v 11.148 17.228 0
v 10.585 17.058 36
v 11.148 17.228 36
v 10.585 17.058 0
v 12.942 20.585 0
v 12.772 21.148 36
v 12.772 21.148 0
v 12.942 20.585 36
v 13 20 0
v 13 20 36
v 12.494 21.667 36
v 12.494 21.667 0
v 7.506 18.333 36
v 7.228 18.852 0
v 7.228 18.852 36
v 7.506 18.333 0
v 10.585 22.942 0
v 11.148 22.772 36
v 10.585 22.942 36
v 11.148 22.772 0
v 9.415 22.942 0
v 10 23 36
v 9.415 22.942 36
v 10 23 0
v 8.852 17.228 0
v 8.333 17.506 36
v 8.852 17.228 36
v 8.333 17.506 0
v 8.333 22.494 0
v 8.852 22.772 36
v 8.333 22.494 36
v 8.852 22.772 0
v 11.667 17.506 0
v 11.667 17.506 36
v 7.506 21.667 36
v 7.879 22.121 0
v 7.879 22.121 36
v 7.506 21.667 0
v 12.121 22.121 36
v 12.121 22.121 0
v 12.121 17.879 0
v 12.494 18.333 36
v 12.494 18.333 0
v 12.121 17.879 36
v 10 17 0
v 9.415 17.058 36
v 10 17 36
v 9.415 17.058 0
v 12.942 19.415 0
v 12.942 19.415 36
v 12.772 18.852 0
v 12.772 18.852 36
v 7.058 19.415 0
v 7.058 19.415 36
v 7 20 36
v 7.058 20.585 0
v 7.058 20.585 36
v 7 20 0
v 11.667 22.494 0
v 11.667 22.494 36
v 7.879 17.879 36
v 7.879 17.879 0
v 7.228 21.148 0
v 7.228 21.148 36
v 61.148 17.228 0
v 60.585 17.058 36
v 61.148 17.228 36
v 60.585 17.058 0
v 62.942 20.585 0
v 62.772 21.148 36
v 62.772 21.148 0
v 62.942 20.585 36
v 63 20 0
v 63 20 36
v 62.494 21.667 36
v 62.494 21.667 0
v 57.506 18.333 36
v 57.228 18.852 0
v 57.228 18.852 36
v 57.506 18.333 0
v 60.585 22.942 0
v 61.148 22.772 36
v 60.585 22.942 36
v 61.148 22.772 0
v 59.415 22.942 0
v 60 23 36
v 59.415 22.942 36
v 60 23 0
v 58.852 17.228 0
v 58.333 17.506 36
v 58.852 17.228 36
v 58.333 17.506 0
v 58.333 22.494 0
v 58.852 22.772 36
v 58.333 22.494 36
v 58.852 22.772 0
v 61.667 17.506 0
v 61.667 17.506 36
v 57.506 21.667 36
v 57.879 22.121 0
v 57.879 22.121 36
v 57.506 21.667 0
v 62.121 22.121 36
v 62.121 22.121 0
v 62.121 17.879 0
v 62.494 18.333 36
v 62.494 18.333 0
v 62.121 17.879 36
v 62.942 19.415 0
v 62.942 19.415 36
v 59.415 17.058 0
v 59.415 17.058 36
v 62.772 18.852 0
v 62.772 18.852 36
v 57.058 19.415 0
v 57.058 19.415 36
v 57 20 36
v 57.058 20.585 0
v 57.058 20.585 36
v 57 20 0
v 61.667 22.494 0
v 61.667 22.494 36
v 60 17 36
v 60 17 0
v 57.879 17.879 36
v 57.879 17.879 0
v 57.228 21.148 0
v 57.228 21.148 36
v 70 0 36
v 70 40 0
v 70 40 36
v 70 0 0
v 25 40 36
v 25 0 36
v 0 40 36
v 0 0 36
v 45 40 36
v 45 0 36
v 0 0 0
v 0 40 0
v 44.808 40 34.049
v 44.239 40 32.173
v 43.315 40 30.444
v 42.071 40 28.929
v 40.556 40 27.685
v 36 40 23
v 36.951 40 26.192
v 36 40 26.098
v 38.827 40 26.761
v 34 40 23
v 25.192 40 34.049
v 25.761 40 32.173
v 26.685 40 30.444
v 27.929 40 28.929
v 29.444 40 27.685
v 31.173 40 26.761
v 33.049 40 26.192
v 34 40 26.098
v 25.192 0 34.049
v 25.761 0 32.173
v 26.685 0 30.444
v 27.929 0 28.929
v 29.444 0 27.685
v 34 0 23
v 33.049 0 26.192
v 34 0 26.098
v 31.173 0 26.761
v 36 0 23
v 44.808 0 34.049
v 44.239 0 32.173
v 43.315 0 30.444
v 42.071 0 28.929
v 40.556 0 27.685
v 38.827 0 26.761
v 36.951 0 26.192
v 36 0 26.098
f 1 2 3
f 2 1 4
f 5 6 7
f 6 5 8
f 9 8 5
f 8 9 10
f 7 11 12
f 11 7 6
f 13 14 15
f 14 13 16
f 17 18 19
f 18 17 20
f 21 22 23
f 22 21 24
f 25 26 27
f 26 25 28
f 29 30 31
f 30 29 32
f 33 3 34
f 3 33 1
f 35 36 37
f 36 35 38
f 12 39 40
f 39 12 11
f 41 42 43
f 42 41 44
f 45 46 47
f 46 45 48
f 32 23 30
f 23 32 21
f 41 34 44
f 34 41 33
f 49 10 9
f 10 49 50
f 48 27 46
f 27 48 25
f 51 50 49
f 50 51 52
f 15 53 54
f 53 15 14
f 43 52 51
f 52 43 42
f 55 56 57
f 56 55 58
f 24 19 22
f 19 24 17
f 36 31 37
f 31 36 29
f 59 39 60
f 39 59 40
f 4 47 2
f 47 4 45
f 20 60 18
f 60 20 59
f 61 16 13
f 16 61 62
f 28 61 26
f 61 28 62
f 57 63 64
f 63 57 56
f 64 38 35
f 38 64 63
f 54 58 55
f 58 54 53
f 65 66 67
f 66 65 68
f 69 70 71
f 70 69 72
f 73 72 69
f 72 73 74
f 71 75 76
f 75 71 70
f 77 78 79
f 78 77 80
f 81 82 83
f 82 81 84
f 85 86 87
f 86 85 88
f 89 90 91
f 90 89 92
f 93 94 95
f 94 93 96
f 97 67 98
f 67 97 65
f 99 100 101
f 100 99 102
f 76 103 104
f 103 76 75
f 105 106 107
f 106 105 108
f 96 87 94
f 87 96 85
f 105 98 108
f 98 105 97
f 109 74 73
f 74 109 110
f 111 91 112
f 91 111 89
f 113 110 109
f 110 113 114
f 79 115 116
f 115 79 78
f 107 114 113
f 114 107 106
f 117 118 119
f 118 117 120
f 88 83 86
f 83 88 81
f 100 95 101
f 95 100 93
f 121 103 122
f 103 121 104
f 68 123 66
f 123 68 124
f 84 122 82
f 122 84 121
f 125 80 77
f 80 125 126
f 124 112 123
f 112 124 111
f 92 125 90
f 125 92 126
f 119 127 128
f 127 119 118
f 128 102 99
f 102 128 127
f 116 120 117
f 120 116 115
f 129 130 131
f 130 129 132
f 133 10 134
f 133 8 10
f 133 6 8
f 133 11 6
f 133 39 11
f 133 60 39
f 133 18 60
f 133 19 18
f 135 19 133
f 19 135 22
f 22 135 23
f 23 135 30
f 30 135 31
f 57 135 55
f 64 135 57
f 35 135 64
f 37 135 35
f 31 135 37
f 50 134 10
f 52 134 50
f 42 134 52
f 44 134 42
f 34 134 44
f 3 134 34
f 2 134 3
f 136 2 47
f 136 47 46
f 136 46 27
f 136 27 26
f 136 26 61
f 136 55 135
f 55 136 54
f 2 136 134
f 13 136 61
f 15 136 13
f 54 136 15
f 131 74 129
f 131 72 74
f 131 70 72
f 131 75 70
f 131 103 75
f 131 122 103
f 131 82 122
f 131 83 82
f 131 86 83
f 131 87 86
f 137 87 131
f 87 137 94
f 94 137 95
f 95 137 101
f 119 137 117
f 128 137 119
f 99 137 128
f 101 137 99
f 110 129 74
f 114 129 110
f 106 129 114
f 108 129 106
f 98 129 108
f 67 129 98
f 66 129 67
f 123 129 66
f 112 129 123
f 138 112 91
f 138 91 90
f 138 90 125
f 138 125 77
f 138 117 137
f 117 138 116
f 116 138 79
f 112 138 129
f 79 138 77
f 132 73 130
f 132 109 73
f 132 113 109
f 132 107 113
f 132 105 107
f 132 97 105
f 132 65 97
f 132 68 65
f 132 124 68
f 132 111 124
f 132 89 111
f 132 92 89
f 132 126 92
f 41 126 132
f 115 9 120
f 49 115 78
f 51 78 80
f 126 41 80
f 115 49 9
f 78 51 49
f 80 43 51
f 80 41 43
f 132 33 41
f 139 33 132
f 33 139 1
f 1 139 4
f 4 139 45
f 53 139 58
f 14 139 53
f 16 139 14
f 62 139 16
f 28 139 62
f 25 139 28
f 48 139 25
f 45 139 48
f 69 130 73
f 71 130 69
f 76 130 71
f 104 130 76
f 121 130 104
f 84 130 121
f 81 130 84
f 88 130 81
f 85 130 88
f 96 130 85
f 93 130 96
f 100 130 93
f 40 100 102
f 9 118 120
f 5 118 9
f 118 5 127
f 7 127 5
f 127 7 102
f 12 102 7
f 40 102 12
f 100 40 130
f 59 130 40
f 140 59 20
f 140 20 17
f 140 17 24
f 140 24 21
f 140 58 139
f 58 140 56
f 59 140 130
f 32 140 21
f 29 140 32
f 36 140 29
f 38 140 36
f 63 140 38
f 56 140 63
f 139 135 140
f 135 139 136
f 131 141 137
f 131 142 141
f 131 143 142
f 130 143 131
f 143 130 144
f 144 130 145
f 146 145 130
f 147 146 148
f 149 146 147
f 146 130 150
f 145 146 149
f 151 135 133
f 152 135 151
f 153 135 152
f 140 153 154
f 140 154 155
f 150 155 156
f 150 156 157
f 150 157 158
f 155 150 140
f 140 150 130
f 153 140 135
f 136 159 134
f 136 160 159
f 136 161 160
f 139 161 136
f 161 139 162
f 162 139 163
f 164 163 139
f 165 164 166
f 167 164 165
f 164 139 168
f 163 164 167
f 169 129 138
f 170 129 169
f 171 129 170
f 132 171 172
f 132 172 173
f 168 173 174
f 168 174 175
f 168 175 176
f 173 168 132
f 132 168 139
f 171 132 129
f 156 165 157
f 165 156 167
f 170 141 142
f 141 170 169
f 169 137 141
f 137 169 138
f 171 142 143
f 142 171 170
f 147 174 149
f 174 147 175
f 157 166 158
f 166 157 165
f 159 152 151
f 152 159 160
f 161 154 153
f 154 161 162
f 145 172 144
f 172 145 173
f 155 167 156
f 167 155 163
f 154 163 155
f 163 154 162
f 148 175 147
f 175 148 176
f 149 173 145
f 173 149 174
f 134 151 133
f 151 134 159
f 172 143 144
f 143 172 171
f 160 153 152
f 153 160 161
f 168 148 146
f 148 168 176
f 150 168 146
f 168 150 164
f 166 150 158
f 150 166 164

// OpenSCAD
$fn = 32;

// ----------------------------------------------------------------------
// Saddle clamp: split shaft clamp
// ----------------------------------------------------------------------

// --- parameters (mm) ---
blk_l = 70;               // block length, X
blk_w = 40;               // block width, Y
blk_h = 36;               // block height
clamp_r = 10;             // shaft groove radius
hole_r = 3;               // bolt hole radius
hole_m = 10;              // bolt hole margin from the ends
saw_w = 2;                // saw kerf width
fit_tol = 0.02;           // tolerance for press fits, mm
free_tol = 0.2;           // tolerance for clearance fits, mm

saw_depth = clamp_r + 3;  // saw kerf depth

difference() {
  cube([blk_l, blk_w, blk_h]);
  translate([blk_l / 2, -1, blk_h])
    rotate([-90, 0, 0])
      cylinder(h = blk_w + 2, r = clamp_r);
  for (sx = [0, 1])
    translate([sx ? blk_l - hole_m : hole_m, blk_w / 2, -1])
      cylinder(r = hole_r, h = blk_h + 2);
  translate([blk_l / 2 - saw_w / 2, -1, blk_h - saw_depth])
    cube([saw_w, blk_w + 2, saw_depth + 1]);
}
